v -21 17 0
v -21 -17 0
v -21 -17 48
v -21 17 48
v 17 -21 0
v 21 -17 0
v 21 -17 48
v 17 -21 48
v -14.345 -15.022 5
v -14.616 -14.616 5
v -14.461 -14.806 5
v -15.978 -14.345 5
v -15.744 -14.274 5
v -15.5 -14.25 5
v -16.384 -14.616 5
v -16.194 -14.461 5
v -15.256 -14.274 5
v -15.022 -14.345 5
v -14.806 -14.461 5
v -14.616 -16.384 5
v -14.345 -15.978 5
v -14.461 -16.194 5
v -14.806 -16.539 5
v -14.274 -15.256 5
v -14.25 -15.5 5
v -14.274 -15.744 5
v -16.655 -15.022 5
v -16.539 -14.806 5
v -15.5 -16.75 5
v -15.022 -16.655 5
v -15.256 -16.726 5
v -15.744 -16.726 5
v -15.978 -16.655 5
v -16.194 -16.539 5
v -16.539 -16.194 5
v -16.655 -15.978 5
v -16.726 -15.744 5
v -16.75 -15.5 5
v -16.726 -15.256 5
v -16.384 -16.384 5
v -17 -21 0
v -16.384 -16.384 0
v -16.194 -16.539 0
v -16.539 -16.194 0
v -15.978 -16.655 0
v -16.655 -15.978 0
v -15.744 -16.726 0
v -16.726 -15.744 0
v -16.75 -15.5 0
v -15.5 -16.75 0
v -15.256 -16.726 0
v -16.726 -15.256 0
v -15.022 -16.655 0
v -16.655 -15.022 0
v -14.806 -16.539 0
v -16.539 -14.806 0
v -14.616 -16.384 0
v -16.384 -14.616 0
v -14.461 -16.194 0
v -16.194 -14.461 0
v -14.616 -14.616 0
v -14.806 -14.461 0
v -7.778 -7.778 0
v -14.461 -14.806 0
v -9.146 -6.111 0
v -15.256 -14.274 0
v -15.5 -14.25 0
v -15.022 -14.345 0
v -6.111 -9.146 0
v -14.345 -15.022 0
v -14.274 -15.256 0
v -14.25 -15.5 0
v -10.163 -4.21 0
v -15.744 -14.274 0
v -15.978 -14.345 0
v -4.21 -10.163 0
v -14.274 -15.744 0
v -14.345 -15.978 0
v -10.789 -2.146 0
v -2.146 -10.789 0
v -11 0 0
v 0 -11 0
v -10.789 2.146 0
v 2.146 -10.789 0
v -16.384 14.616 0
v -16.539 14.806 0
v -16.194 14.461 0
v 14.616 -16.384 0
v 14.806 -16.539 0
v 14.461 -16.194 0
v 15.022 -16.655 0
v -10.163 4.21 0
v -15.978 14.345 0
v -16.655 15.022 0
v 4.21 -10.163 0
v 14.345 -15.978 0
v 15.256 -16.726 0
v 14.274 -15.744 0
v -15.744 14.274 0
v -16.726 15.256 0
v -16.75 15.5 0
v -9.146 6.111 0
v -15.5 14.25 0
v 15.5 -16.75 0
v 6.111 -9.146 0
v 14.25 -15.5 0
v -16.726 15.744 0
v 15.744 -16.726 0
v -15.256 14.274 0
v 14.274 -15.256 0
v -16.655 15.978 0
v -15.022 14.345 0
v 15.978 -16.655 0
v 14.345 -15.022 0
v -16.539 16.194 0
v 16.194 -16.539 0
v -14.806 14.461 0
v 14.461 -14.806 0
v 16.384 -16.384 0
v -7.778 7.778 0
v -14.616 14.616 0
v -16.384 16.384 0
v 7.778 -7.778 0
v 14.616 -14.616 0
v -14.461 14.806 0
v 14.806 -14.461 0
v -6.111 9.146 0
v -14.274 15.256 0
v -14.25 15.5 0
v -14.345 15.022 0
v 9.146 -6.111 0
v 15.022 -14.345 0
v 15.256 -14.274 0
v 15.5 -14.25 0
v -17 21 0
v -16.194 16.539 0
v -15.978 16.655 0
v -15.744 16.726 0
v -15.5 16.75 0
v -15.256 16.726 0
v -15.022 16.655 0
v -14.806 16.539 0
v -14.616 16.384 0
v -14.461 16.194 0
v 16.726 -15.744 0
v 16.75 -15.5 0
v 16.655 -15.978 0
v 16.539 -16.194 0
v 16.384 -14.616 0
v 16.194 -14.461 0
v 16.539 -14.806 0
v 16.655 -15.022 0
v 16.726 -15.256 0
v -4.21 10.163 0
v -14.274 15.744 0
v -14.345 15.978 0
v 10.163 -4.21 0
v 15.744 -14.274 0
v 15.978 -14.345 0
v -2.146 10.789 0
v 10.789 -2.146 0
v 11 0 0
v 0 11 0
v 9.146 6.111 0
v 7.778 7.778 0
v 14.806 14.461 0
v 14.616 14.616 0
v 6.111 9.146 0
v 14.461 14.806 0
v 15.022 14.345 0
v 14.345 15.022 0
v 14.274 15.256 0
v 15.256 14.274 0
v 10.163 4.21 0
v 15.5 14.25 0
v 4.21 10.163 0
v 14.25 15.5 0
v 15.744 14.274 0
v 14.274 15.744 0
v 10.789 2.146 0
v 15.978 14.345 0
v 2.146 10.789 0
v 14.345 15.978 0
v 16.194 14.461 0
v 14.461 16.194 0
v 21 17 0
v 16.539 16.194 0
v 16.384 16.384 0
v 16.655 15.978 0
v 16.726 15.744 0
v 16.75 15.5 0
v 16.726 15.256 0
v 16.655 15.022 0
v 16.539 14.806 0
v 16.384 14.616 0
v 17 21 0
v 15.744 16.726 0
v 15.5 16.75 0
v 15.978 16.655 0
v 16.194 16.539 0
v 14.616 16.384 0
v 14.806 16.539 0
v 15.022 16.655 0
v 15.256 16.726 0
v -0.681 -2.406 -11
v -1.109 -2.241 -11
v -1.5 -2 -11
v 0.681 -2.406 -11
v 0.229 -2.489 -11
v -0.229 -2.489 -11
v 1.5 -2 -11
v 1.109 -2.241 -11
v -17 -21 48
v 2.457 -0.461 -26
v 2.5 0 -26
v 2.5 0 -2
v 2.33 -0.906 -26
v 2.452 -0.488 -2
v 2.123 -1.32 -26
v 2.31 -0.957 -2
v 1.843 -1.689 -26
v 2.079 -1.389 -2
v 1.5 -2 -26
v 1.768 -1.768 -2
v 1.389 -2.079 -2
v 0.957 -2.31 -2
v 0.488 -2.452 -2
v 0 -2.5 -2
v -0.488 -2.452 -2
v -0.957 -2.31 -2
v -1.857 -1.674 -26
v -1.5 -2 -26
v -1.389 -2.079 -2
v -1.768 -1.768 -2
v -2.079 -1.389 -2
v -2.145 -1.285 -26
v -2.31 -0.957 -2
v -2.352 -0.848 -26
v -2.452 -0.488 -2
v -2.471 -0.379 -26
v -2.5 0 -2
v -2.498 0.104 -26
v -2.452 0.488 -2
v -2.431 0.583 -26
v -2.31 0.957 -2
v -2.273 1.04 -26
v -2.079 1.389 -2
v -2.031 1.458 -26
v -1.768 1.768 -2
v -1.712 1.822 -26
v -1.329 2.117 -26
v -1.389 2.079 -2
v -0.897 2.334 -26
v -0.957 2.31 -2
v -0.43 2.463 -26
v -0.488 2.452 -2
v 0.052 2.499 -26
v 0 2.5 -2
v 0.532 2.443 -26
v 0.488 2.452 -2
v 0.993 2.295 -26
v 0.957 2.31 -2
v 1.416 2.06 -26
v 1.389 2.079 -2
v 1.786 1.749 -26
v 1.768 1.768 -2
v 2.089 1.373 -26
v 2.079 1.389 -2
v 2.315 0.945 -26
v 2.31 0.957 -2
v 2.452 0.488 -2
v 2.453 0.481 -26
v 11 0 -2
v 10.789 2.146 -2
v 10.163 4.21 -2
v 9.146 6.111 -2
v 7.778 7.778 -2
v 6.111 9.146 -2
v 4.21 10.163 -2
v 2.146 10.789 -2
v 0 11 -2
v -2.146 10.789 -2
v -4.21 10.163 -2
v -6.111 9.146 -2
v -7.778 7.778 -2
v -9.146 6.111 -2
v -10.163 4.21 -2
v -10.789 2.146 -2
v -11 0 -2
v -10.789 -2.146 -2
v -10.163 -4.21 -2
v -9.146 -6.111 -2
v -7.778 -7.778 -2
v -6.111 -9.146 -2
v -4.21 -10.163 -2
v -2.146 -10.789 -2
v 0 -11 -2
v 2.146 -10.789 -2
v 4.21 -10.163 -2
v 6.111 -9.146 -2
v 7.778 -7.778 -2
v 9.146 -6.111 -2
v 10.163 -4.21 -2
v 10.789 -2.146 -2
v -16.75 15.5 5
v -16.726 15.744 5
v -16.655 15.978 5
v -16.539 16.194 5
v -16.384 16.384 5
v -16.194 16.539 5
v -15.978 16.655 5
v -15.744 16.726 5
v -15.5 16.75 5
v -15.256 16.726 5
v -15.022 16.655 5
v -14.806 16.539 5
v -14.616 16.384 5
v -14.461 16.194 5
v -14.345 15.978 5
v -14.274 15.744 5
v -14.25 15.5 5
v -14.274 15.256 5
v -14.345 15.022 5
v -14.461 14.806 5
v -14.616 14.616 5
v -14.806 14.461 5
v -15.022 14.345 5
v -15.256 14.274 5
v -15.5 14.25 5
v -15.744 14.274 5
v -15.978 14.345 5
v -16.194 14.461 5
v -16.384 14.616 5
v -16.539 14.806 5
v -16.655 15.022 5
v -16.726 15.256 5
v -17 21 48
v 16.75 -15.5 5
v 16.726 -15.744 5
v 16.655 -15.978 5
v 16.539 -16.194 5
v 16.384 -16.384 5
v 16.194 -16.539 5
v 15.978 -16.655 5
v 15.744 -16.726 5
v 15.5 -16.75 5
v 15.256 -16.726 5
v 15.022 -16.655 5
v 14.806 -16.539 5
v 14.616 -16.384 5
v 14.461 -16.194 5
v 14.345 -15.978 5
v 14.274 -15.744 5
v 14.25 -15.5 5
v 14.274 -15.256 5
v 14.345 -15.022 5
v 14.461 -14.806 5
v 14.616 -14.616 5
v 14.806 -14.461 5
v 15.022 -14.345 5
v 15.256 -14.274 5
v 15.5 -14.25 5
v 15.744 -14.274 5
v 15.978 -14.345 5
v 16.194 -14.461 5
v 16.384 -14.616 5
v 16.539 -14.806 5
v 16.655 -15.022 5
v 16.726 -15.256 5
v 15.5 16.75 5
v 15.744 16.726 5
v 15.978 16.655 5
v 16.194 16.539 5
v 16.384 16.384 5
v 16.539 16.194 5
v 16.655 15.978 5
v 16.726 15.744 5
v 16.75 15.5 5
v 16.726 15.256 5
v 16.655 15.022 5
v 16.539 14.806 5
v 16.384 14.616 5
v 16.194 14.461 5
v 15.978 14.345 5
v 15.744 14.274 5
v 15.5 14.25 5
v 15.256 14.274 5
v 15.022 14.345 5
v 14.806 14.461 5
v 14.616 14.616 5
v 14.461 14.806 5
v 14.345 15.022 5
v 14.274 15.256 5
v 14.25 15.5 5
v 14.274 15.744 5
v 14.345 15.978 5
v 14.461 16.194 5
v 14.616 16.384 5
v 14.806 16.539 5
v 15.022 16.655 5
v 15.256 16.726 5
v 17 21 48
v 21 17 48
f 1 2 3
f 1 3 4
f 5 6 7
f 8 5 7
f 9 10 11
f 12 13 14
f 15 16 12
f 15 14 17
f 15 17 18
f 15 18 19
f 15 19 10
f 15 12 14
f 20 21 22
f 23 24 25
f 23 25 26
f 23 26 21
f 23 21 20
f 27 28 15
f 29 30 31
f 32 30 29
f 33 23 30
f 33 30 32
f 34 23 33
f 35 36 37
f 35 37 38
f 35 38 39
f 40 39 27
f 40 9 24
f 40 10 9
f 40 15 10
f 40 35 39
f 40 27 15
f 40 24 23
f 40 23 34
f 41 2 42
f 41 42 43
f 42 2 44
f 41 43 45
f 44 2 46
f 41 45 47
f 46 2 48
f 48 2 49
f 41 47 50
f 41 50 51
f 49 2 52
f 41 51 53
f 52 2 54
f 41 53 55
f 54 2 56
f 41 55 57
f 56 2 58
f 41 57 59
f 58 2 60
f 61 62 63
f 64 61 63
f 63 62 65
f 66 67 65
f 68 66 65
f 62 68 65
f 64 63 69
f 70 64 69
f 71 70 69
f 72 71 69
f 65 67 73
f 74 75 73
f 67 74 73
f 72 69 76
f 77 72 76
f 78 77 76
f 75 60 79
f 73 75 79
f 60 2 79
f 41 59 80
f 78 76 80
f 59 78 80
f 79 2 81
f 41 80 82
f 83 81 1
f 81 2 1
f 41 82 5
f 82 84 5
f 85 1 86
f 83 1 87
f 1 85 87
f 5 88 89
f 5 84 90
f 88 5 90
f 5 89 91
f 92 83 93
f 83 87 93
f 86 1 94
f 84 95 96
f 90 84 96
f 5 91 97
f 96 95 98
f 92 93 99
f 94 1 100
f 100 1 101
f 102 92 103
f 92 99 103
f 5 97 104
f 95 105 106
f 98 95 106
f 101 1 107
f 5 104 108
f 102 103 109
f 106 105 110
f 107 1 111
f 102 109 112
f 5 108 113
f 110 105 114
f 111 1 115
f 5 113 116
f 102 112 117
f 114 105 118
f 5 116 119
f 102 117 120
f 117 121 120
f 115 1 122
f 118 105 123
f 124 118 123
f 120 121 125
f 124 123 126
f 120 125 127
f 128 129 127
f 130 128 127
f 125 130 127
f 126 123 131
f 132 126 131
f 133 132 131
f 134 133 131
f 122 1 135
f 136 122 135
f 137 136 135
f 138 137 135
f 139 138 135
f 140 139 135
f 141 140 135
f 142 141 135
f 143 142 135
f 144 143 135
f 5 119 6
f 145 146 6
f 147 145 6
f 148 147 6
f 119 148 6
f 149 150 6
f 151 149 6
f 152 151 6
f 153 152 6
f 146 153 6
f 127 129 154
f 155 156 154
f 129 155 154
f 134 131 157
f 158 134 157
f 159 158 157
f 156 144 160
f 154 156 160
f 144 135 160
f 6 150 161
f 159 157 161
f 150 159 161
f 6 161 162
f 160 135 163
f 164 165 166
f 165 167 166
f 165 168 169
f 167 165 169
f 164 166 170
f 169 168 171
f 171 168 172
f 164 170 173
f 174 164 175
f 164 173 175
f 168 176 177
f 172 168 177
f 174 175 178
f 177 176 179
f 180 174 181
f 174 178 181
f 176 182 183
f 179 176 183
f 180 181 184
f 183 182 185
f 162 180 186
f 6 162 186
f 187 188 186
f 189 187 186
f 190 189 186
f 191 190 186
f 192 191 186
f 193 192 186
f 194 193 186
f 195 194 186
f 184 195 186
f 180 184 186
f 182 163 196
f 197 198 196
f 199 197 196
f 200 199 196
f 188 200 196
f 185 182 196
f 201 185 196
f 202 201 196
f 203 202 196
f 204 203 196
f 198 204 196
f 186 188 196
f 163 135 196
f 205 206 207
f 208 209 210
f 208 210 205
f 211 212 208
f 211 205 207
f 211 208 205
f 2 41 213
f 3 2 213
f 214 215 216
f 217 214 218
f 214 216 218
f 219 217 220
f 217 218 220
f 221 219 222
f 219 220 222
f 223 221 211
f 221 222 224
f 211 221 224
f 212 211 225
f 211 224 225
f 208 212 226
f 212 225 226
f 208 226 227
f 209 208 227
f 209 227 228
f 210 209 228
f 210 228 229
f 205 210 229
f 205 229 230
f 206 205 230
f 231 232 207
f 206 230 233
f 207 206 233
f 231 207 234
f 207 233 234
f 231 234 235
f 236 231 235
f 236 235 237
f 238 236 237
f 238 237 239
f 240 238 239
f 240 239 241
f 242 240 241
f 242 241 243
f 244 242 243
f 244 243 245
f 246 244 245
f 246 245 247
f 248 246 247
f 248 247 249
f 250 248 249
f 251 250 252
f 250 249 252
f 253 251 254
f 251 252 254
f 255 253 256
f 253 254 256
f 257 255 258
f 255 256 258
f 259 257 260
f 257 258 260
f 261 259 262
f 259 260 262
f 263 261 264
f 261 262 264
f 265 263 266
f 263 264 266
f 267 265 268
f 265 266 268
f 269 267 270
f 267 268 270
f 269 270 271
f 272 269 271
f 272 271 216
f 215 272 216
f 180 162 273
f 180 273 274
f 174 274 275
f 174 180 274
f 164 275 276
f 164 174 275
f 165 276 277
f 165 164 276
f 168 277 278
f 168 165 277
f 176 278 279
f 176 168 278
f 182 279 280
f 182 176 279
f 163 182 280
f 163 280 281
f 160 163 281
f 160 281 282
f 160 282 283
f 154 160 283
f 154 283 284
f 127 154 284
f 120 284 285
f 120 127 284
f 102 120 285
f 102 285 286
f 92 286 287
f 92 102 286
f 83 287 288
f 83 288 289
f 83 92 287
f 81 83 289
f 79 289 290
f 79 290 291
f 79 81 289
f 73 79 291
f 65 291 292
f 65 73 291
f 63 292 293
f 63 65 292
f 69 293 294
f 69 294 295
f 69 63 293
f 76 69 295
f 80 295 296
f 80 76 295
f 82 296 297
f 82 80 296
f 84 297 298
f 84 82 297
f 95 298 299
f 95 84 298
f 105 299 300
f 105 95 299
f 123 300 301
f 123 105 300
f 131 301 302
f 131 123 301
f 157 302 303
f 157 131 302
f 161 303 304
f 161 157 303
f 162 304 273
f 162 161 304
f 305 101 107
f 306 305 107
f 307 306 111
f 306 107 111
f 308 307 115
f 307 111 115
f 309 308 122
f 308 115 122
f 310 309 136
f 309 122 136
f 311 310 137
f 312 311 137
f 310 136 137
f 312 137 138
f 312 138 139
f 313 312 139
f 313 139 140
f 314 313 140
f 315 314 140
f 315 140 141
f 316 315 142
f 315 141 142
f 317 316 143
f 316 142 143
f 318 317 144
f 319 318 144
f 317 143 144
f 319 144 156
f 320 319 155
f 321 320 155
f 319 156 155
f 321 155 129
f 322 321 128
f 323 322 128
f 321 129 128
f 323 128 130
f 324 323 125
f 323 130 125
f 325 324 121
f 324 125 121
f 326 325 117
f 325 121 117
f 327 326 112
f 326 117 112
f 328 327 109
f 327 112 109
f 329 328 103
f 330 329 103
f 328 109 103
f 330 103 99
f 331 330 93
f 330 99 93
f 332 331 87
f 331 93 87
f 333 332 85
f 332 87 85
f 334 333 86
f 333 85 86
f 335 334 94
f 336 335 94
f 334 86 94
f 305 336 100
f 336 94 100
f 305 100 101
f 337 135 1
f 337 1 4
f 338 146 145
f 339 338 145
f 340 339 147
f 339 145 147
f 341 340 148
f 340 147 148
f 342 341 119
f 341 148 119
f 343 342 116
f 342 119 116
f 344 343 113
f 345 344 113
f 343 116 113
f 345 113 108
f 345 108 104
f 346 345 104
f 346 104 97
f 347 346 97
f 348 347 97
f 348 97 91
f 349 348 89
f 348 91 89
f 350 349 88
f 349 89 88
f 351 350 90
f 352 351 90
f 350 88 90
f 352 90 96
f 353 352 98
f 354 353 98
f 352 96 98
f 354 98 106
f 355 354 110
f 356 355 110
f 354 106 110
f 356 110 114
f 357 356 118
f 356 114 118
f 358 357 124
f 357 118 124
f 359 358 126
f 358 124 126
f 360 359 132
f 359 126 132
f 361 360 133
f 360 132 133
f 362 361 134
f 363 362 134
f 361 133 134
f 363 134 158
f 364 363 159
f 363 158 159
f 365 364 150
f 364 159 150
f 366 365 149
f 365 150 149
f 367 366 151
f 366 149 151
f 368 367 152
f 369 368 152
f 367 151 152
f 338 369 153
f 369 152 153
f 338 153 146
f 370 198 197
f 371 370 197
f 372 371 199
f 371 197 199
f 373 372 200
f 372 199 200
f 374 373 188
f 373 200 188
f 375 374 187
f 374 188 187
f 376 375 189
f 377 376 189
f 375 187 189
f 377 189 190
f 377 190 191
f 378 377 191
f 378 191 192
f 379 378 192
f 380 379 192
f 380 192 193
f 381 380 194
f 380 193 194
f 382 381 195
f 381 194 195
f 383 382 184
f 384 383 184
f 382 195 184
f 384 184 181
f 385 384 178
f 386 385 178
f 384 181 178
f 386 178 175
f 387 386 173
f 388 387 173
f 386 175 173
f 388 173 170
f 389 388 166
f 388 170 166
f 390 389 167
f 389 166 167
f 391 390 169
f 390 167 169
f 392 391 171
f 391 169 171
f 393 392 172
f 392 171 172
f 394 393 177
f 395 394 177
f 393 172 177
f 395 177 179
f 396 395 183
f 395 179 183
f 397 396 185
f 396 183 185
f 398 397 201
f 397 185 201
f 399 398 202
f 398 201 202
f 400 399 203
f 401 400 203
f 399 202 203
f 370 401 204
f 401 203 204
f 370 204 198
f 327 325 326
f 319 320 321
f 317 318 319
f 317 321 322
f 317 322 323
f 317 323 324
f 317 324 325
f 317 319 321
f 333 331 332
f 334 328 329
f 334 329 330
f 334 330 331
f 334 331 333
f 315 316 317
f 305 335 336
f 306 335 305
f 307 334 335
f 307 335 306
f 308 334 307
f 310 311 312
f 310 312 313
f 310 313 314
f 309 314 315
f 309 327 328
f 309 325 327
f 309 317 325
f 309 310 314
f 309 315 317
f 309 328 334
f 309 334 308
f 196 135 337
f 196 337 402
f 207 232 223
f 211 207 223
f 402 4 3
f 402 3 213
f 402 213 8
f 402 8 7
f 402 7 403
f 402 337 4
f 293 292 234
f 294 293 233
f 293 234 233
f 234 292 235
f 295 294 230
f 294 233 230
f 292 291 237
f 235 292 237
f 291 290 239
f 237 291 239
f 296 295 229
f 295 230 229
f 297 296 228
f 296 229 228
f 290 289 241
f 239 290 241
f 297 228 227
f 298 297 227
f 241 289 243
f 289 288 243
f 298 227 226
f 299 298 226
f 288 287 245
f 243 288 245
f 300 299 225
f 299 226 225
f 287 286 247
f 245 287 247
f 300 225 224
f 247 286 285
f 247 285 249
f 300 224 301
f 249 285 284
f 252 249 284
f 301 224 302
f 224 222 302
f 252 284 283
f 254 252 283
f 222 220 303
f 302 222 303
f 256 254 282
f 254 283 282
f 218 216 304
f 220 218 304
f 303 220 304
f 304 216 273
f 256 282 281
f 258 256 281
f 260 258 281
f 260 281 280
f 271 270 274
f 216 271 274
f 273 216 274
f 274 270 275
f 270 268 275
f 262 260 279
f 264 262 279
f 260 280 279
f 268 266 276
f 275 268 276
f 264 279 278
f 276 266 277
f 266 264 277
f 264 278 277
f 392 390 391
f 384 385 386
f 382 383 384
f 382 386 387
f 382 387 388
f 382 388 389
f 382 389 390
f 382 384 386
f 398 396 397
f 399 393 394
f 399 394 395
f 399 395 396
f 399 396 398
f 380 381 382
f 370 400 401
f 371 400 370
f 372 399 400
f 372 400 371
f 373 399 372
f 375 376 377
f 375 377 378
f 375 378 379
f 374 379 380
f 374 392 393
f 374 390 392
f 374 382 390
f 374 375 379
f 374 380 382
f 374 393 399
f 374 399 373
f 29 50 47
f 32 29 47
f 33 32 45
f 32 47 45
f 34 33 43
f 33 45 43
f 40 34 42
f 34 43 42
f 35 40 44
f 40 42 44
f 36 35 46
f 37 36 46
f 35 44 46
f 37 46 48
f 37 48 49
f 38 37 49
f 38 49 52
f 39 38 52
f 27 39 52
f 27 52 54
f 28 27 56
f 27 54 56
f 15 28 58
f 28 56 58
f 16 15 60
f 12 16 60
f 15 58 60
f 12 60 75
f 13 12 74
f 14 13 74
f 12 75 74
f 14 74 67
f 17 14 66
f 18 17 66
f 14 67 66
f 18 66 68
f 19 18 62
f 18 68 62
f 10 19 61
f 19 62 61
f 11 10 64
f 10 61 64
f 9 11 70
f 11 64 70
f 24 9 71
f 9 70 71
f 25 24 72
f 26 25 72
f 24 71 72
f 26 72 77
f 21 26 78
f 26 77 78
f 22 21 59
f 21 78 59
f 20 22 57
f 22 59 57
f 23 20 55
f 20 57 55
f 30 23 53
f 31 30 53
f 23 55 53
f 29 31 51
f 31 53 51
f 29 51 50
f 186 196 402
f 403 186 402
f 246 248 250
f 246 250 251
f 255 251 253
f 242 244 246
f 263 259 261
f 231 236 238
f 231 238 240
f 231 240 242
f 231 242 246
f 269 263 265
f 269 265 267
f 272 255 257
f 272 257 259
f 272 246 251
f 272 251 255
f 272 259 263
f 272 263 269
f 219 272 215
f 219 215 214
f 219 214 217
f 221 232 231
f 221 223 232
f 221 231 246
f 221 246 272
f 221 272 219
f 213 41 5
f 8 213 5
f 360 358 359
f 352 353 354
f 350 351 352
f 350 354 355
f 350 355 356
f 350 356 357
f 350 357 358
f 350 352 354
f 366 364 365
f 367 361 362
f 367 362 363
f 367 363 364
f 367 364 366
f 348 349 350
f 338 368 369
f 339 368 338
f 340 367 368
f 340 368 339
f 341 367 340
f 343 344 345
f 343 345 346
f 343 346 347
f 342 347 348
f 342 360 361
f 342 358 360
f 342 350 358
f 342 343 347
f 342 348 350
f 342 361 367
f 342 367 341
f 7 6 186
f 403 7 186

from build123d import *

# Parameters (mm, degrees)
SKETCH_W           = 42
SKETCH_H           = 42
PAD_DEPTH          = 48
CHAMFER_SIZE       = 4
SKETCH001_R        = 11
PAD001_DEPTH       = 2
SKETCH002_R        = 2.5
PAD002_DEPTH       = 24
POCKET_DEPTH       = 15
SKETCH004_R        = 1.25
POCKET001_DEPTH    = 5
POLARPATTERN_COUNT = 4


with BuildPart() as part:
    # Sketch → Pad (new body)
    with BuildSketch(Plane.XY):
        Rectangle(SKETCH_W, SKETCH_H)
    extrude(amount=PAD_DEPTH)

    # Chamfer
    chamfer_edges = [part.edges().sort_by_distance(p)[0] for p in [
        (21, -21, 24),
        (-21, -21, 24),
        (21, 21, 24),
        (-21, 21, 24),
    ]]
    chamfer(chamfer_edges, length=CHAMFER_SIZE)

    # Sketch001 → Pad001 (join)
    with BuildSketch(Plane.XY):
        Circle(SKETCH001_R)
    extrude(amount=-PAD001_DEPTH)

    # Sketch002 (on Face12 of Pad001) → Pad002 (join)
    with BuildSketch(Plane(origin=(0, 0, -2), x_dir=(1, 0, 0), z_dir=(0, 0, -1))):
        Circle(SKETCH002_R)
    extrude(amount=PAD002_DEPTH)

    # Sketch003 (on Face14 of Pad002) → Pocket (cut)
    with BuildSketch(Plane(origin=(0, 0, -26), x_dir=(1, 0, 0), z_dir=(0, 0, -1))):
        with BuildLine():
            ThreePointArc((1.5, 2), (0, 2.5), (-1.5, 2))
            Line((-1.5, 2), (1.5, 2))
        make_face()
    extrude(amount=-POCKET_DEPTH, mode=Mode.SUBTRACT)

    # Sketch004 (on Face2 of Pocket) → Pocket001 (cut)
    with BuildSketch(Plane(origin=(0, 0, 0), x_dir=(1, 0, 0), z_dir=(0, 0, -1))):
        with Locations((15.5, 15.5)):
            Circle(SKETCH004_R)
    pocket001 = extrude(amount=-POCKET001_DEPTH, mode=Mode.SUBTRACT)

    # PolarPattern: Pocket001 ×4 about axis
    polarpattern_axis = Axis((0, 0, 0), (0, 0, 1))
    for i in range(1, POLARPATTERN_COUNT):
        add(pocket001.rotate(polarpattern_axis, i * 360 / POLARPATTERN_COUNT), mode=Mode.SUBTRACT)


solid = part.part
